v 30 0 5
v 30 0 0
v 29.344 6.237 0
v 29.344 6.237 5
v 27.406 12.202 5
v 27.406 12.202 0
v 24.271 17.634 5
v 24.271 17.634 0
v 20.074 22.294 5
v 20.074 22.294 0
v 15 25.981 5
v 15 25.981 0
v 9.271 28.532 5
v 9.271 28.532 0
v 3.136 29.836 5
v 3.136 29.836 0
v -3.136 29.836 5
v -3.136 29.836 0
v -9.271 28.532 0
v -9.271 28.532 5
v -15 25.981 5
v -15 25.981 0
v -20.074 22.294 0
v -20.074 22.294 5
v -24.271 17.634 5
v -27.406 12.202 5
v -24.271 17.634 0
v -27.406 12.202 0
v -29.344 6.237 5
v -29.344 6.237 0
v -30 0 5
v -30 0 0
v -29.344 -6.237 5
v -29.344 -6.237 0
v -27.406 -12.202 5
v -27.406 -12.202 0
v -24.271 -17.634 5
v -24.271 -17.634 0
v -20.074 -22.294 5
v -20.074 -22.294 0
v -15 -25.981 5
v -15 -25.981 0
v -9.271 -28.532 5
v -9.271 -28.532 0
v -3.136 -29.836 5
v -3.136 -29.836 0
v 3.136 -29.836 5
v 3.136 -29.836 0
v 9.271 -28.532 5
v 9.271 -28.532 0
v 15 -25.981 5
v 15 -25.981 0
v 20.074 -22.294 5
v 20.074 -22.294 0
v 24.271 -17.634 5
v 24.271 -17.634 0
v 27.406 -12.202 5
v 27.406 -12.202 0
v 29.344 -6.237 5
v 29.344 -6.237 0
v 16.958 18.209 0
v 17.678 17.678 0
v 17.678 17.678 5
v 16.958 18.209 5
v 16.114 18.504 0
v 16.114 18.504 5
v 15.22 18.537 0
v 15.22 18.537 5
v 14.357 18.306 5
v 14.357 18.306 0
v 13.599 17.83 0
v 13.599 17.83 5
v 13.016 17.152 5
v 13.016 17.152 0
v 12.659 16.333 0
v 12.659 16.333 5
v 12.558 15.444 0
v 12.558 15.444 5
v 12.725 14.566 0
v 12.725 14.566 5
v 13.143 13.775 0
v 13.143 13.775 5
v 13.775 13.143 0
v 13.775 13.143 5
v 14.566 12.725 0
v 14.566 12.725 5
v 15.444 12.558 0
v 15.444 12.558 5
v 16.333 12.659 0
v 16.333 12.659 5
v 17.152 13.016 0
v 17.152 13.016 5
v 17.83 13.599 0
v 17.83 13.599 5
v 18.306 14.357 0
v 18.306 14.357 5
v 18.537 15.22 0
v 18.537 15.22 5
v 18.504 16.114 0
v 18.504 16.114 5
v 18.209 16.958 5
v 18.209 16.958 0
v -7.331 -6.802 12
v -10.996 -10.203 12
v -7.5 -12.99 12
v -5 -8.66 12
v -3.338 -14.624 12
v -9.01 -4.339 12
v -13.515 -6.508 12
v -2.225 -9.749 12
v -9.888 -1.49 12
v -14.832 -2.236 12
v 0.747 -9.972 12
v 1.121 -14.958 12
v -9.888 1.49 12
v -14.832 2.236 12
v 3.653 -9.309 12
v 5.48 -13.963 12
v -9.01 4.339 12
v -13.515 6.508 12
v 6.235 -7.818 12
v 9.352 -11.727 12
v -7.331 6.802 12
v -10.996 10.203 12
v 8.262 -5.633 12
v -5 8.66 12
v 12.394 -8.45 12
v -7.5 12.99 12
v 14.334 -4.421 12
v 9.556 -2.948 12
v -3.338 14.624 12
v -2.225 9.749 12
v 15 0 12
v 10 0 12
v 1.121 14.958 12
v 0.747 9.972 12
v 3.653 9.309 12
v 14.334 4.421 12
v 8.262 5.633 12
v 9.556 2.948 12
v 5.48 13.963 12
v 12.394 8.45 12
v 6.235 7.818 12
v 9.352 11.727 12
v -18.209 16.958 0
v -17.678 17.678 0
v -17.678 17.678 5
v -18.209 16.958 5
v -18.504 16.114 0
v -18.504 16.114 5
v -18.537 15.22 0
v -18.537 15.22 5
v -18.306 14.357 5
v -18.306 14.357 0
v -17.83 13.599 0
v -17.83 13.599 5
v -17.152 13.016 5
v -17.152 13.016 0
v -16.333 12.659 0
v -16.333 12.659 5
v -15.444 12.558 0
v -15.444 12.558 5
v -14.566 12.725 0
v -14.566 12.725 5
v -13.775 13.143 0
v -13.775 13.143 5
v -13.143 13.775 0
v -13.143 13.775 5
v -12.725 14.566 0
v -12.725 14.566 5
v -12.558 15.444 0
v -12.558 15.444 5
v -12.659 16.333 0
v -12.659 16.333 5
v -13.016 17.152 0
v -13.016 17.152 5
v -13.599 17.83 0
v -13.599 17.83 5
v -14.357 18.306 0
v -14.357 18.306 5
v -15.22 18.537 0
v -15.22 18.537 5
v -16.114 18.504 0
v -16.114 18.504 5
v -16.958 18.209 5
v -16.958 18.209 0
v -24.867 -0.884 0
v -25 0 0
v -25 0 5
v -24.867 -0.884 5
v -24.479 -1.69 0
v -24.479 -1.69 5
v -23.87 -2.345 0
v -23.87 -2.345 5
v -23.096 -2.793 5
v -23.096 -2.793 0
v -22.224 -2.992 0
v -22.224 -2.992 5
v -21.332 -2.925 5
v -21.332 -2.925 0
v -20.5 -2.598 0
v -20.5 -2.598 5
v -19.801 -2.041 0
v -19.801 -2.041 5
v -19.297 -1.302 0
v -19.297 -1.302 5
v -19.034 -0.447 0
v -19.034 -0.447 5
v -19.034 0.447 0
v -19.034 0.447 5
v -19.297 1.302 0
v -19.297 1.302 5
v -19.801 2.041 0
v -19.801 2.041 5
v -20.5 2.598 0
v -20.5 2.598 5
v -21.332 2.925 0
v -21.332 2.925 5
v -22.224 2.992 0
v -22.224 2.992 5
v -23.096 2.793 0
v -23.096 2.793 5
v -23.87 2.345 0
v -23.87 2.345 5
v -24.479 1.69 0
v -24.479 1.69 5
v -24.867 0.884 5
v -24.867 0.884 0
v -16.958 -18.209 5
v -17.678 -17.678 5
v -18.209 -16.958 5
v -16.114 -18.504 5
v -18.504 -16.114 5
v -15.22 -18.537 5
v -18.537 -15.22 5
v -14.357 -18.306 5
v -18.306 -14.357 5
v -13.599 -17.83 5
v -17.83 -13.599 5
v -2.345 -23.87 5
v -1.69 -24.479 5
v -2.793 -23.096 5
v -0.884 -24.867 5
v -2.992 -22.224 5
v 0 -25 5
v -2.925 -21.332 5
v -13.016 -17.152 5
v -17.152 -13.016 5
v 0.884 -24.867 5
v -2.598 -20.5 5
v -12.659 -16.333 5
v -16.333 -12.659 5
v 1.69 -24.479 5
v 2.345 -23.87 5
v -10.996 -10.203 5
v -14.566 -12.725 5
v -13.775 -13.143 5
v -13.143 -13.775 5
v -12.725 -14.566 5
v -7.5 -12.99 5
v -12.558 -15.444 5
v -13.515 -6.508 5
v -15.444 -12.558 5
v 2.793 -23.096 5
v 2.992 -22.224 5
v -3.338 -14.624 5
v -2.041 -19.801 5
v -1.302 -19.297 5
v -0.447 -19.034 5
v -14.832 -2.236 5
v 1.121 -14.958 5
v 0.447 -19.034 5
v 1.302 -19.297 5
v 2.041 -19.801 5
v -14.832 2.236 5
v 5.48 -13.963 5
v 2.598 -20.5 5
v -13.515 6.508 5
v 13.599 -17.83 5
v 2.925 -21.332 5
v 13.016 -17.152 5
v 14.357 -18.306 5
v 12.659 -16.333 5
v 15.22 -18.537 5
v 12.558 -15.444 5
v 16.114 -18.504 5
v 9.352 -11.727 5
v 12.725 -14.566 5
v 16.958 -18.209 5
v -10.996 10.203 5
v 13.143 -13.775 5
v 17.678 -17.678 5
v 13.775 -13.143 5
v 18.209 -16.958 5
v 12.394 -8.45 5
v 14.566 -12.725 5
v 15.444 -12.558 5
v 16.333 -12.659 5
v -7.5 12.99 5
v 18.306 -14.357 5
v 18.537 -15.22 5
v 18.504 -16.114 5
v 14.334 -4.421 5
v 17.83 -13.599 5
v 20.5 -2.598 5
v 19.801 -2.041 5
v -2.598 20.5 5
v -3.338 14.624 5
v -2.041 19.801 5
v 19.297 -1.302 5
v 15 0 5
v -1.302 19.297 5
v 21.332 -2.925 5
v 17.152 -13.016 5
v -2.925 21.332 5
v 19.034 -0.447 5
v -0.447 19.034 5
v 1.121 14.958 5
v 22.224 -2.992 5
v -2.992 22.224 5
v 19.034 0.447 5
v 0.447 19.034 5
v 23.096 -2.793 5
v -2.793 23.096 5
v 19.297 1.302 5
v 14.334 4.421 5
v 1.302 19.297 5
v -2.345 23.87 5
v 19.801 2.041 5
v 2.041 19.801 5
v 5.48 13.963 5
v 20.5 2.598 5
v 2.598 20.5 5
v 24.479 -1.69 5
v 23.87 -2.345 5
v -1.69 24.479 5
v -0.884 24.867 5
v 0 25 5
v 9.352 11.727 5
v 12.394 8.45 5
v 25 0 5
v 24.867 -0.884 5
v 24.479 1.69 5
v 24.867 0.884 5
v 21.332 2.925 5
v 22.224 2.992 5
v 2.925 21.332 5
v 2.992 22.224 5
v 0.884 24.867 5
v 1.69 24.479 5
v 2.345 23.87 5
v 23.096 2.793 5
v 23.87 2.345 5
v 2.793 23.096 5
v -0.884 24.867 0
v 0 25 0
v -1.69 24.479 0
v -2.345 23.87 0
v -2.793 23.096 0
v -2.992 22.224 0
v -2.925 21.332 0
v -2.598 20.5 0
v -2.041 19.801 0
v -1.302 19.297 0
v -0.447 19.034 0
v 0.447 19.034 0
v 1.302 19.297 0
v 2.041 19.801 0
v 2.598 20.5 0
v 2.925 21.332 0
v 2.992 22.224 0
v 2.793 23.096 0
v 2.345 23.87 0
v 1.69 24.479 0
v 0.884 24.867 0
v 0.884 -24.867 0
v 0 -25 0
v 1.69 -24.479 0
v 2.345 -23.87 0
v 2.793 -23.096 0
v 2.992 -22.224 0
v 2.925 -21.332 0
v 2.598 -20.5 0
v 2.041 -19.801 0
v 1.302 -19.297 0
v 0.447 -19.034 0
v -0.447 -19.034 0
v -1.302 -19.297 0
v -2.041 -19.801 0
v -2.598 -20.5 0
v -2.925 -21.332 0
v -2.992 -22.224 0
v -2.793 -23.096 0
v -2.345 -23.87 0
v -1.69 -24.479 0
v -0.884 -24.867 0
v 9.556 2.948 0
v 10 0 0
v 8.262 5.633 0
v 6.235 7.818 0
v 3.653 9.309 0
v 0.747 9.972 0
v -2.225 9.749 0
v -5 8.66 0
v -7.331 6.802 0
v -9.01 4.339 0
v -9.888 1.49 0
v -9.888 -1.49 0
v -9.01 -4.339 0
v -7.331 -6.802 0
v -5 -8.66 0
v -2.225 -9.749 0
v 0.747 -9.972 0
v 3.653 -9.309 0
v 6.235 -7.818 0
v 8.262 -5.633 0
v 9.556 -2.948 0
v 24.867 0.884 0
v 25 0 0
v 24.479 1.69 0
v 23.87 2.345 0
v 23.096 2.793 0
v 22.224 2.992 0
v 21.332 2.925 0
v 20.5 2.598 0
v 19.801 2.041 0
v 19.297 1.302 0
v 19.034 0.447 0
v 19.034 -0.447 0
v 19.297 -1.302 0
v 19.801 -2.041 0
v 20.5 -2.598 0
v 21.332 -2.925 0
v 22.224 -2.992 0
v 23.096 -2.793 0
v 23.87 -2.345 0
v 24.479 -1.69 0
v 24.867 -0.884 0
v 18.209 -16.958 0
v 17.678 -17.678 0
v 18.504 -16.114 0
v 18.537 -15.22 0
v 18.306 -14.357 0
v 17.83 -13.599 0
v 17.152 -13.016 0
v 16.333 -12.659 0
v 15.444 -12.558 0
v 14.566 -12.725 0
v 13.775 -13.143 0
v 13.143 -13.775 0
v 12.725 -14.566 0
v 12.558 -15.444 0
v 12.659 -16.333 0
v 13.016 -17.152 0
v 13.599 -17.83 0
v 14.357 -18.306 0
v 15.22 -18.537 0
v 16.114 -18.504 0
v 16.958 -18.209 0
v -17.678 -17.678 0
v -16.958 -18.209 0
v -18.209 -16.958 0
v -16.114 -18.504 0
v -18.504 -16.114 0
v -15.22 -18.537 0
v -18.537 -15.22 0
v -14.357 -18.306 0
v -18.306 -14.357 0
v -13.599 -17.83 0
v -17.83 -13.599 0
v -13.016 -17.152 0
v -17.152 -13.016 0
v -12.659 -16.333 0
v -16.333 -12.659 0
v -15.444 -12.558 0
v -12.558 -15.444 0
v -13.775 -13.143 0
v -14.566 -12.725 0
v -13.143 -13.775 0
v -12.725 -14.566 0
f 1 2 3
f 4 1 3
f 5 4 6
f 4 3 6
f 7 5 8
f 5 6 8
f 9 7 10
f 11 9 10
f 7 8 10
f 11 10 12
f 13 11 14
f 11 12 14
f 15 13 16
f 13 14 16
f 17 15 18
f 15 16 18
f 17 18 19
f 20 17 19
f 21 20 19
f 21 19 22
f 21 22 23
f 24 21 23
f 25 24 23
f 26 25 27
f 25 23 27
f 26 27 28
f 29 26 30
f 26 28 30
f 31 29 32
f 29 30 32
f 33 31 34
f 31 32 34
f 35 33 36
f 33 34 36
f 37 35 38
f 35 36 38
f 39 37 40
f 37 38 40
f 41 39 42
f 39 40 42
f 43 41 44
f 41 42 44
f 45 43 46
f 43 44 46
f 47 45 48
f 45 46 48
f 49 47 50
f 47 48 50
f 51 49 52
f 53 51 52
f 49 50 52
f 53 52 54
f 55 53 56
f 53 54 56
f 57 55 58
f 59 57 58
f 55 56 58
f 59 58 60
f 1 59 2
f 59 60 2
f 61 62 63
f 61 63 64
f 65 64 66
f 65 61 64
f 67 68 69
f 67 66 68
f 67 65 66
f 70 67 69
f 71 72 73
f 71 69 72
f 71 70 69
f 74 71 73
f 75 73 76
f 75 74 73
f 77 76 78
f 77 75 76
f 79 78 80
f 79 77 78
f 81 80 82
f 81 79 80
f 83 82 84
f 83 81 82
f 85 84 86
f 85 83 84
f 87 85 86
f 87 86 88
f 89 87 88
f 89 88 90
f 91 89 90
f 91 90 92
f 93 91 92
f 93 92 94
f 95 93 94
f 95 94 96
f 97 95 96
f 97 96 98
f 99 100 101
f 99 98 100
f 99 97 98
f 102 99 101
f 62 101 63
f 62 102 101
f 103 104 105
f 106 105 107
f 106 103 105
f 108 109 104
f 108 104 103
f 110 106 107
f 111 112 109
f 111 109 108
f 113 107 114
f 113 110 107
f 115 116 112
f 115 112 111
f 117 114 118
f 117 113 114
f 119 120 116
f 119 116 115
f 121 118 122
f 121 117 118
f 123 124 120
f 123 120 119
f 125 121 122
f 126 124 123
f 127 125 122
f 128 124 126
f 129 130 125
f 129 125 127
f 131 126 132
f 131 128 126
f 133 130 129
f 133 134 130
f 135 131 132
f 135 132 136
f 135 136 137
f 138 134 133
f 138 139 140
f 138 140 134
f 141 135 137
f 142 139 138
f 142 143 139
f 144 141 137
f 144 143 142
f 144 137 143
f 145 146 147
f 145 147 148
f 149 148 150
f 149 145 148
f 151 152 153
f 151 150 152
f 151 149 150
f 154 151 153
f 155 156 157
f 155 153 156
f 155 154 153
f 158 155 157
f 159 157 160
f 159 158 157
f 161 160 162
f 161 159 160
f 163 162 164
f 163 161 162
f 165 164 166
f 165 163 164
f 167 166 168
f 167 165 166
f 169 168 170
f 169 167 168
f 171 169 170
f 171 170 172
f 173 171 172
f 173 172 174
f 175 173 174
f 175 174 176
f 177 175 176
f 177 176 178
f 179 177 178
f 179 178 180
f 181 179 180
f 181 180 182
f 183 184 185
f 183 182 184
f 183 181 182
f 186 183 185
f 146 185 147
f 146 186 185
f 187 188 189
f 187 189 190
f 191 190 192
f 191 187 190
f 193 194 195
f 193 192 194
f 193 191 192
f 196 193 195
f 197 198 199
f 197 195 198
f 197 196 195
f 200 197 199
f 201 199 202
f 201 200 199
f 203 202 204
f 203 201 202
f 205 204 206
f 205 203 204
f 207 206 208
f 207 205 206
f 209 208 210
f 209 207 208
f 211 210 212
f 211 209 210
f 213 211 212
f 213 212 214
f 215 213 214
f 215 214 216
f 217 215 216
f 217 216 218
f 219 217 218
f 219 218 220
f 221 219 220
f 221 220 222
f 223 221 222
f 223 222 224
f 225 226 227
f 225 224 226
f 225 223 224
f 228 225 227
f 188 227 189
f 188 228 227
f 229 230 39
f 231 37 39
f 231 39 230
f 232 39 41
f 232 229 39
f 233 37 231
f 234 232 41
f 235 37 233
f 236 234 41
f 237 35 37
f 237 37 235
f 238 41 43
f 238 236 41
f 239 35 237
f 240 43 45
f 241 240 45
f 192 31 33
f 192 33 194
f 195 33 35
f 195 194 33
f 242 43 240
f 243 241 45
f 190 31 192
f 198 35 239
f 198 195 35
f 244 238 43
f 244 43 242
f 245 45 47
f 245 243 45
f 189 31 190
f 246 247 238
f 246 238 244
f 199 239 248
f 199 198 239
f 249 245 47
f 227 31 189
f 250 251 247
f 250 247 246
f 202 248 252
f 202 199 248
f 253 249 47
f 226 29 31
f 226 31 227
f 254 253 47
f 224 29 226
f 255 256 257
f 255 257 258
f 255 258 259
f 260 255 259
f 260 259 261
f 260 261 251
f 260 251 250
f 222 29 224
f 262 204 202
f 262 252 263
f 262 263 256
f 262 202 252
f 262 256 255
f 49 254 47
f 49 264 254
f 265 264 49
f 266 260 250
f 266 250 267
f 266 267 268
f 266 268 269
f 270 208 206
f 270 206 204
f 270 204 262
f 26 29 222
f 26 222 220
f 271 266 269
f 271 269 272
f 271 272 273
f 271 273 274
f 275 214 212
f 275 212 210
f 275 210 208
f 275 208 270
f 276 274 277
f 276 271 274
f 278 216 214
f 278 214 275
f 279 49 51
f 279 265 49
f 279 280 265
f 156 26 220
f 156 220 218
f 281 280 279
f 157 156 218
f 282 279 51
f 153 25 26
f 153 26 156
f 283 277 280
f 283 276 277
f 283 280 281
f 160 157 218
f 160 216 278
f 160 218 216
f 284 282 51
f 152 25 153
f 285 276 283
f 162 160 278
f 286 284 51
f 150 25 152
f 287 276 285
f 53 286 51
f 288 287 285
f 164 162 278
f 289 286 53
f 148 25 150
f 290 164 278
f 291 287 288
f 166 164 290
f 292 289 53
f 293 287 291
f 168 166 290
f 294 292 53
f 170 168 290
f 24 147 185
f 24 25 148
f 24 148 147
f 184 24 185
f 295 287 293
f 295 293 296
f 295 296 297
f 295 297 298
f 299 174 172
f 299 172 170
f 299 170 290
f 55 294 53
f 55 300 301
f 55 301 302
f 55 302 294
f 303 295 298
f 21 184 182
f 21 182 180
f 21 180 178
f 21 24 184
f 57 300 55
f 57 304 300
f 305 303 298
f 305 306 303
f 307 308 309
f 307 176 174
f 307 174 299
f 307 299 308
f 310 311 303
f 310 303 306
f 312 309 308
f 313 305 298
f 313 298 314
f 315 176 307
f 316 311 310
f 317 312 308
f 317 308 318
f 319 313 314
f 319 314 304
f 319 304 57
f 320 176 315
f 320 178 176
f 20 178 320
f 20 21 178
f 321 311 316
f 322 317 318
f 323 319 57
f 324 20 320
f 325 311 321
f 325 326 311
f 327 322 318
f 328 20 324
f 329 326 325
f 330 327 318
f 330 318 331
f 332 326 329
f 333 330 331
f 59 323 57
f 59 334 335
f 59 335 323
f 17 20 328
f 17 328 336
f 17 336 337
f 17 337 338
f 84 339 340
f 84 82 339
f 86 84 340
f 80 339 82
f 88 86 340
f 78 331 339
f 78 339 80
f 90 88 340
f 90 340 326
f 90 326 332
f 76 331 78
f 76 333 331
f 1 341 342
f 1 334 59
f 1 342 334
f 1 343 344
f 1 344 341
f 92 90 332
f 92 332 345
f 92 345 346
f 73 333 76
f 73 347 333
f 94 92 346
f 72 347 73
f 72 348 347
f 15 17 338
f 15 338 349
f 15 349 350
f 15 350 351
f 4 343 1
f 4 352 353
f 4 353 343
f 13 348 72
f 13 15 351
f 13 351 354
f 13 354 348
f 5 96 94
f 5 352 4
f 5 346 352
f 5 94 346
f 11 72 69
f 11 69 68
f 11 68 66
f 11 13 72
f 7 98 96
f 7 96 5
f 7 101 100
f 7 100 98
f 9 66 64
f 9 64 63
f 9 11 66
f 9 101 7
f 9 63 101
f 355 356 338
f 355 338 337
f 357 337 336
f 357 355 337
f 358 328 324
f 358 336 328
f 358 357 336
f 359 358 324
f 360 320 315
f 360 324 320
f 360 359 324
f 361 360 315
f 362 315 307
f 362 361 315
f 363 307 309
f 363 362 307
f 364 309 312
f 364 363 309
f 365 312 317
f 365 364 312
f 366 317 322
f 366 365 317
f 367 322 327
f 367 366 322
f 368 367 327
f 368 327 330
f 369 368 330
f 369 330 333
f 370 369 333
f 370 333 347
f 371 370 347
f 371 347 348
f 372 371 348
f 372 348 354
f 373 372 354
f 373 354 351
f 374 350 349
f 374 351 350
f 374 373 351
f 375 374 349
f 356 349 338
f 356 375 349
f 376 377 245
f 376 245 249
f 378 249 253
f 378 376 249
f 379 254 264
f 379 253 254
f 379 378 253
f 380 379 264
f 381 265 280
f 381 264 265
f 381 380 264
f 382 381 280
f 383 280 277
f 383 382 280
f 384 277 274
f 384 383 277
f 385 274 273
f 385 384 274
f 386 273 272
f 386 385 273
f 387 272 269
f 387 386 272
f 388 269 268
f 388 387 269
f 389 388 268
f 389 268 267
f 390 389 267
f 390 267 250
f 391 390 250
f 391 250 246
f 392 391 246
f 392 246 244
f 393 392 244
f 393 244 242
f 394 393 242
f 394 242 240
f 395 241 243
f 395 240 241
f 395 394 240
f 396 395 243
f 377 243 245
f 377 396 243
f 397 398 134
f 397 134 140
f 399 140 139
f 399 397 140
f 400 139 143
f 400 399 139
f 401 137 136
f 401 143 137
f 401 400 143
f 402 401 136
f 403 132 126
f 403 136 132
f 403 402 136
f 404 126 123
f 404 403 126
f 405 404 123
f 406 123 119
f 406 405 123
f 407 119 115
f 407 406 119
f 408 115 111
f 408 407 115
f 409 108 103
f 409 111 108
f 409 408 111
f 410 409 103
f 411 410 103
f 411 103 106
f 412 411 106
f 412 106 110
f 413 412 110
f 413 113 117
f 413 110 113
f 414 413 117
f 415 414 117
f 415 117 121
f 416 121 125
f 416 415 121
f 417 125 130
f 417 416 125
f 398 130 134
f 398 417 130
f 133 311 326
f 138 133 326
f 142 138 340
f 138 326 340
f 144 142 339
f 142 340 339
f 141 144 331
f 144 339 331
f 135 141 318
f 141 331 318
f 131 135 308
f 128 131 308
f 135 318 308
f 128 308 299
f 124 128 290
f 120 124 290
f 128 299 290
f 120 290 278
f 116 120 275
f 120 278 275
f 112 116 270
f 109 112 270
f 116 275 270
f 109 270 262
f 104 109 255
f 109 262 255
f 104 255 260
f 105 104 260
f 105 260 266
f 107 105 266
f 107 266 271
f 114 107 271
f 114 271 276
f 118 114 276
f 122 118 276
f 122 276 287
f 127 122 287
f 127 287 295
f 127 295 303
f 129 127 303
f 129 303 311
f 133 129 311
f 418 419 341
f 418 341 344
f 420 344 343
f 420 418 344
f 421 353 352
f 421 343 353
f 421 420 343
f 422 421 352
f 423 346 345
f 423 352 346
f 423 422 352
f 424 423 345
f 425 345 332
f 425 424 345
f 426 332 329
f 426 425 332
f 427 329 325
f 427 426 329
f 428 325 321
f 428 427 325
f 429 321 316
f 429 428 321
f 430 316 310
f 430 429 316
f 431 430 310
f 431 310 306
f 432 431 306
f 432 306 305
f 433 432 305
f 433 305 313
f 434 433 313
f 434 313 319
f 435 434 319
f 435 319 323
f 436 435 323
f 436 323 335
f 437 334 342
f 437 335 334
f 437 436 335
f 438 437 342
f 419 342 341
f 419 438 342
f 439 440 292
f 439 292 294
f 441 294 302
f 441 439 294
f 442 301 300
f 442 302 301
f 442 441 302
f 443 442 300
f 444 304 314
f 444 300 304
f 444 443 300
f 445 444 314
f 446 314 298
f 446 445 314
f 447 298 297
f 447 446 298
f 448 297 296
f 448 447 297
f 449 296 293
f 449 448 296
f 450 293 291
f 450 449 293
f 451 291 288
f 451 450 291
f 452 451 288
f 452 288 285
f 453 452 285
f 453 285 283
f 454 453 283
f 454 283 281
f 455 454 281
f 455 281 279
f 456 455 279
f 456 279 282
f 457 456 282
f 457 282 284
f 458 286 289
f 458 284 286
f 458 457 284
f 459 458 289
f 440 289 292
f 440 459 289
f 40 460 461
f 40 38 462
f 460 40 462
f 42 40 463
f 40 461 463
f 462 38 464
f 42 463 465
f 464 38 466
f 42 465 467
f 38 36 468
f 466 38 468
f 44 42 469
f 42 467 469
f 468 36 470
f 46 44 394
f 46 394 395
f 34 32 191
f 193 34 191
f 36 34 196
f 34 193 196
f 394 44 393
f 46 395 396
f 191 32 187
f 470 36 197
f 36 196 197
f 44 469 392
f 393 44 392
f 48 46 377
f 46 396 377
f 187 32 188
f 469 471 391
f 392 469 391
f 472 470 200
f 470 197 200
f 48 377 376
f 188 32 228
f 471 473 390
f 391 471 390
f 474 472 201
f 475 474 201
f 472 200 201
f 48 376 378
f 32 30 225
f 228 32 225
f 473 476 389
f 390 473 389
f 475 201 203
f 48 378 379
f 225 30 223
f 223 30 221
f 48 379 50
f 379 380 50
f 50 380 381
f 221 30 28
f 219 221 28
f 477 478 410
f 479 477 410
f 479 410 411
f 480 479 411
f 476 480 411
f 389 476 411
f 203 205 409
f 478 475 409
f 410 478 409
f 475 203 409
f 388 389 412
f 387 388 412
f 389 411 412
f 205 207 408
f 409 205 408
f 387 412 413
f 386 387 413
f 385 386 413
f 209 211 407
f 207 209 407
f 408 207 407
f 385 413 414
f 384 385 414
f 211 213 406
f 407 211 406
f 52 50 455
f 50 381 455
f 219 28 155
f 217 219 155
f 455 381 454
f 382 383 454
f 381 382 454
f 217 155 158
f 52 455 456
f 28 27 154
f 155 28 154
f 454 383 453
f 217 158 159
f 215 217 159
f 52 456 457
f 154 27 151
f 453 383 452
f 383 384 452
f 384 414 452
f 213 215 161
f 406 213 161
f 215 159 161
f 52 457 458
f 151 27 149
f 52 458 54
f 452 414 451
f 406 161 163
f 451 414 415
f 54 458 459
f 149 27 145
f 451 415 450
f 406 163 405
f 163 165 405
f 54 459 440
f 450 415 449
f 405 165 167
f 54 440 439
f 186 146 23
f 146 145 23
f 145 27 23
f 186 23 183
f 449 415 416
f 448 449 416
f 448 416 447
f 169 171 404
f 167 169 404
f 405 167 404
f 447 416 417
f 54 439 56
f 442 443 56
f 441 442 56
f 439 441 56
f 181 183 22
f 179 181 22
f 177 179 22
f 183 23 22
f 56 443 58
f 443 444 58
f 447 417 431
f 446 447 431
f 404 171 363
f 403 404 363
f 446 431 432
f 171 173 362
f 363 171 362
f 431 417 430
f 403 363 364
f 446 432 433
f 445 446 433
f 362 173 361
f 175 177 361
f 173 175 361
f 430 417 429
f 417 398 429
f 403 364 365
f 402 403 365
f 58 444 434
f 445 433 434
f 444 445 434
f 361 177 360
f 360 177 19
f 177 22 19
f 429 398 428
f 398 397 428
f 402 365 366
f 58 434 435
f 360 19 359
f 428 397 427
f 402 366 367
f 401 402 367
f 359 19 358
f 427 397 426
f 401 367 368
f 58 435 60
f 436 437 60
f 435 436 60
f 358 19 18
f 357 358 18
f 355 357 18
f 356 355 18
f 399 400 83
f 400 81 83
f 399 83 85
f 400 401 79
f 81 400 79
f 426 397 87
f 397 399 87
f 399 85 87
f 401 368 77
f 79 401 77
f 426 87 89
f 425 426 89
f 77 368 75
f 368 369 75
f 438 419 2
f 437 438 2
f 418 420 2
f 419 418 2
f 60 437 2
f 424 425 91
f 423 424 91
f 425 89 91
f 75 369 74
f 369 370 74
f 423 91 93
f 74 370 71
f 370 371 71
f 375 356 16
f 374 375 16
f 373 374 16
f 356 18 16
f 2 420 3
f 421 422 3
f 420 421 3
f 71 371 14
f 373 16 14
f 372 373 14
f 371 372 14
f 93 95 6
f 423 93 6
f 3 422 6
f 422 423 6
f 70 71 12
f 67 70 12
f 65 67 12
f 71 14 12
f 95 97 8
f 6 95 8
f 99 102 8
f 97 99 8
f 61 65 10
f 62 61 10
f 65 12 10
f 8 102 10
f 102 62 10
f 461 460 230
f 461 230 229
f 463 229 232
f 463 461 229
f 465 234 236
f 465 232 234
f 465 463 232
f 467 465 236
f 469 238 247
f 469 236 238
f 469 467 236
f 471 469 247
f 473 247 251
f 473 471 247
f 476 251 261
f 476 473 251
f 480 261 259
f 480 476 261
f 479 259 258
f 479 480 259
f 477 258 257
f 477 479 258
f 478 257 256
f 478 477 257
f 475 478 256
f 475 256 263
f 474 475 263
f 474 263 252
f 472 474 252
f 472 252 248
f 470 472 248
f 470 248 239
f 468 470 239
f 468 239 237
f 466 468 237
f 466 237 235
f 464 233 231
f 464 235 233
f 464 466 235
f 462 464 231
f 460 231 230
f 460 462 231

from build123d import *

# Parameters (mm, degrees)
CYLINDER003_R     = 3
CYLINDER003_DEPTH = 10
ARRAY_COUNT       = 8
CYLINDER002_R     = 10
CYLINDER002_DEPTH = 30
CYLINDER001_R     = 15
CYLINDER001_DEPTH = 12
CYLINDER_R        = 30
CYLINDER_DEPTH    = 5


with BuildPart() as array:
    # Cylinder003 → Cylinder003 (new body)
    with BuildSketch(Plane(origin=(22, 0, -2), x_dir=(1, 0, 0), z_dir=(0, 0, 1))):
        Circle(CYLINDER003_R)
    extrude(amount=CYLINDER003_DEPTH)

    # Array: Array ×8 about axis
    array_axis = Axis((0, 0, 0), (0, 0, 1))


with BuildPart() as array_1:
    add(array.part)
    for i in range(1, ARRAY_COUNT):
        add(array.part.rotate(array_axis, i * 360 / ARRAY_COUNT))


with BuildPart() as cilindro:
    # Cylinder002 → Cylinder002 (new body)
    with BuildSketch(Plane.XY.offset(-2)):
        Circle(CYLINDER002_R)
    extrude(amount=CYLINDER002_DEPTH)


with BuildPart() as tubo_exterior:
    # Cylinder001 → Cylinder001 (new body)
    with BuildSketch(Plane.XY):
        Circle(CYLINDER001_R)
    extrude(amount=CYLINDER001_DEPTH)


with BuildPart() as cut001:
    # Cylinder → Cylinder (new body)
    with BuildSketch(Plane.XY):
        Circle(CYLINDER_R)
    extrude(amount=CYLINDER_DEPTH)

    # Fusion: union tubo exterior
    add(tubo_exterior.part)

    # Cut: cut Cilindro
    add(cilindro.part, mode=Mode.SUBTRACT)

    # Cut001: cut Array
    add(array_1.part, mode=Mode.SUBTRACT)


solid = cut001.part
